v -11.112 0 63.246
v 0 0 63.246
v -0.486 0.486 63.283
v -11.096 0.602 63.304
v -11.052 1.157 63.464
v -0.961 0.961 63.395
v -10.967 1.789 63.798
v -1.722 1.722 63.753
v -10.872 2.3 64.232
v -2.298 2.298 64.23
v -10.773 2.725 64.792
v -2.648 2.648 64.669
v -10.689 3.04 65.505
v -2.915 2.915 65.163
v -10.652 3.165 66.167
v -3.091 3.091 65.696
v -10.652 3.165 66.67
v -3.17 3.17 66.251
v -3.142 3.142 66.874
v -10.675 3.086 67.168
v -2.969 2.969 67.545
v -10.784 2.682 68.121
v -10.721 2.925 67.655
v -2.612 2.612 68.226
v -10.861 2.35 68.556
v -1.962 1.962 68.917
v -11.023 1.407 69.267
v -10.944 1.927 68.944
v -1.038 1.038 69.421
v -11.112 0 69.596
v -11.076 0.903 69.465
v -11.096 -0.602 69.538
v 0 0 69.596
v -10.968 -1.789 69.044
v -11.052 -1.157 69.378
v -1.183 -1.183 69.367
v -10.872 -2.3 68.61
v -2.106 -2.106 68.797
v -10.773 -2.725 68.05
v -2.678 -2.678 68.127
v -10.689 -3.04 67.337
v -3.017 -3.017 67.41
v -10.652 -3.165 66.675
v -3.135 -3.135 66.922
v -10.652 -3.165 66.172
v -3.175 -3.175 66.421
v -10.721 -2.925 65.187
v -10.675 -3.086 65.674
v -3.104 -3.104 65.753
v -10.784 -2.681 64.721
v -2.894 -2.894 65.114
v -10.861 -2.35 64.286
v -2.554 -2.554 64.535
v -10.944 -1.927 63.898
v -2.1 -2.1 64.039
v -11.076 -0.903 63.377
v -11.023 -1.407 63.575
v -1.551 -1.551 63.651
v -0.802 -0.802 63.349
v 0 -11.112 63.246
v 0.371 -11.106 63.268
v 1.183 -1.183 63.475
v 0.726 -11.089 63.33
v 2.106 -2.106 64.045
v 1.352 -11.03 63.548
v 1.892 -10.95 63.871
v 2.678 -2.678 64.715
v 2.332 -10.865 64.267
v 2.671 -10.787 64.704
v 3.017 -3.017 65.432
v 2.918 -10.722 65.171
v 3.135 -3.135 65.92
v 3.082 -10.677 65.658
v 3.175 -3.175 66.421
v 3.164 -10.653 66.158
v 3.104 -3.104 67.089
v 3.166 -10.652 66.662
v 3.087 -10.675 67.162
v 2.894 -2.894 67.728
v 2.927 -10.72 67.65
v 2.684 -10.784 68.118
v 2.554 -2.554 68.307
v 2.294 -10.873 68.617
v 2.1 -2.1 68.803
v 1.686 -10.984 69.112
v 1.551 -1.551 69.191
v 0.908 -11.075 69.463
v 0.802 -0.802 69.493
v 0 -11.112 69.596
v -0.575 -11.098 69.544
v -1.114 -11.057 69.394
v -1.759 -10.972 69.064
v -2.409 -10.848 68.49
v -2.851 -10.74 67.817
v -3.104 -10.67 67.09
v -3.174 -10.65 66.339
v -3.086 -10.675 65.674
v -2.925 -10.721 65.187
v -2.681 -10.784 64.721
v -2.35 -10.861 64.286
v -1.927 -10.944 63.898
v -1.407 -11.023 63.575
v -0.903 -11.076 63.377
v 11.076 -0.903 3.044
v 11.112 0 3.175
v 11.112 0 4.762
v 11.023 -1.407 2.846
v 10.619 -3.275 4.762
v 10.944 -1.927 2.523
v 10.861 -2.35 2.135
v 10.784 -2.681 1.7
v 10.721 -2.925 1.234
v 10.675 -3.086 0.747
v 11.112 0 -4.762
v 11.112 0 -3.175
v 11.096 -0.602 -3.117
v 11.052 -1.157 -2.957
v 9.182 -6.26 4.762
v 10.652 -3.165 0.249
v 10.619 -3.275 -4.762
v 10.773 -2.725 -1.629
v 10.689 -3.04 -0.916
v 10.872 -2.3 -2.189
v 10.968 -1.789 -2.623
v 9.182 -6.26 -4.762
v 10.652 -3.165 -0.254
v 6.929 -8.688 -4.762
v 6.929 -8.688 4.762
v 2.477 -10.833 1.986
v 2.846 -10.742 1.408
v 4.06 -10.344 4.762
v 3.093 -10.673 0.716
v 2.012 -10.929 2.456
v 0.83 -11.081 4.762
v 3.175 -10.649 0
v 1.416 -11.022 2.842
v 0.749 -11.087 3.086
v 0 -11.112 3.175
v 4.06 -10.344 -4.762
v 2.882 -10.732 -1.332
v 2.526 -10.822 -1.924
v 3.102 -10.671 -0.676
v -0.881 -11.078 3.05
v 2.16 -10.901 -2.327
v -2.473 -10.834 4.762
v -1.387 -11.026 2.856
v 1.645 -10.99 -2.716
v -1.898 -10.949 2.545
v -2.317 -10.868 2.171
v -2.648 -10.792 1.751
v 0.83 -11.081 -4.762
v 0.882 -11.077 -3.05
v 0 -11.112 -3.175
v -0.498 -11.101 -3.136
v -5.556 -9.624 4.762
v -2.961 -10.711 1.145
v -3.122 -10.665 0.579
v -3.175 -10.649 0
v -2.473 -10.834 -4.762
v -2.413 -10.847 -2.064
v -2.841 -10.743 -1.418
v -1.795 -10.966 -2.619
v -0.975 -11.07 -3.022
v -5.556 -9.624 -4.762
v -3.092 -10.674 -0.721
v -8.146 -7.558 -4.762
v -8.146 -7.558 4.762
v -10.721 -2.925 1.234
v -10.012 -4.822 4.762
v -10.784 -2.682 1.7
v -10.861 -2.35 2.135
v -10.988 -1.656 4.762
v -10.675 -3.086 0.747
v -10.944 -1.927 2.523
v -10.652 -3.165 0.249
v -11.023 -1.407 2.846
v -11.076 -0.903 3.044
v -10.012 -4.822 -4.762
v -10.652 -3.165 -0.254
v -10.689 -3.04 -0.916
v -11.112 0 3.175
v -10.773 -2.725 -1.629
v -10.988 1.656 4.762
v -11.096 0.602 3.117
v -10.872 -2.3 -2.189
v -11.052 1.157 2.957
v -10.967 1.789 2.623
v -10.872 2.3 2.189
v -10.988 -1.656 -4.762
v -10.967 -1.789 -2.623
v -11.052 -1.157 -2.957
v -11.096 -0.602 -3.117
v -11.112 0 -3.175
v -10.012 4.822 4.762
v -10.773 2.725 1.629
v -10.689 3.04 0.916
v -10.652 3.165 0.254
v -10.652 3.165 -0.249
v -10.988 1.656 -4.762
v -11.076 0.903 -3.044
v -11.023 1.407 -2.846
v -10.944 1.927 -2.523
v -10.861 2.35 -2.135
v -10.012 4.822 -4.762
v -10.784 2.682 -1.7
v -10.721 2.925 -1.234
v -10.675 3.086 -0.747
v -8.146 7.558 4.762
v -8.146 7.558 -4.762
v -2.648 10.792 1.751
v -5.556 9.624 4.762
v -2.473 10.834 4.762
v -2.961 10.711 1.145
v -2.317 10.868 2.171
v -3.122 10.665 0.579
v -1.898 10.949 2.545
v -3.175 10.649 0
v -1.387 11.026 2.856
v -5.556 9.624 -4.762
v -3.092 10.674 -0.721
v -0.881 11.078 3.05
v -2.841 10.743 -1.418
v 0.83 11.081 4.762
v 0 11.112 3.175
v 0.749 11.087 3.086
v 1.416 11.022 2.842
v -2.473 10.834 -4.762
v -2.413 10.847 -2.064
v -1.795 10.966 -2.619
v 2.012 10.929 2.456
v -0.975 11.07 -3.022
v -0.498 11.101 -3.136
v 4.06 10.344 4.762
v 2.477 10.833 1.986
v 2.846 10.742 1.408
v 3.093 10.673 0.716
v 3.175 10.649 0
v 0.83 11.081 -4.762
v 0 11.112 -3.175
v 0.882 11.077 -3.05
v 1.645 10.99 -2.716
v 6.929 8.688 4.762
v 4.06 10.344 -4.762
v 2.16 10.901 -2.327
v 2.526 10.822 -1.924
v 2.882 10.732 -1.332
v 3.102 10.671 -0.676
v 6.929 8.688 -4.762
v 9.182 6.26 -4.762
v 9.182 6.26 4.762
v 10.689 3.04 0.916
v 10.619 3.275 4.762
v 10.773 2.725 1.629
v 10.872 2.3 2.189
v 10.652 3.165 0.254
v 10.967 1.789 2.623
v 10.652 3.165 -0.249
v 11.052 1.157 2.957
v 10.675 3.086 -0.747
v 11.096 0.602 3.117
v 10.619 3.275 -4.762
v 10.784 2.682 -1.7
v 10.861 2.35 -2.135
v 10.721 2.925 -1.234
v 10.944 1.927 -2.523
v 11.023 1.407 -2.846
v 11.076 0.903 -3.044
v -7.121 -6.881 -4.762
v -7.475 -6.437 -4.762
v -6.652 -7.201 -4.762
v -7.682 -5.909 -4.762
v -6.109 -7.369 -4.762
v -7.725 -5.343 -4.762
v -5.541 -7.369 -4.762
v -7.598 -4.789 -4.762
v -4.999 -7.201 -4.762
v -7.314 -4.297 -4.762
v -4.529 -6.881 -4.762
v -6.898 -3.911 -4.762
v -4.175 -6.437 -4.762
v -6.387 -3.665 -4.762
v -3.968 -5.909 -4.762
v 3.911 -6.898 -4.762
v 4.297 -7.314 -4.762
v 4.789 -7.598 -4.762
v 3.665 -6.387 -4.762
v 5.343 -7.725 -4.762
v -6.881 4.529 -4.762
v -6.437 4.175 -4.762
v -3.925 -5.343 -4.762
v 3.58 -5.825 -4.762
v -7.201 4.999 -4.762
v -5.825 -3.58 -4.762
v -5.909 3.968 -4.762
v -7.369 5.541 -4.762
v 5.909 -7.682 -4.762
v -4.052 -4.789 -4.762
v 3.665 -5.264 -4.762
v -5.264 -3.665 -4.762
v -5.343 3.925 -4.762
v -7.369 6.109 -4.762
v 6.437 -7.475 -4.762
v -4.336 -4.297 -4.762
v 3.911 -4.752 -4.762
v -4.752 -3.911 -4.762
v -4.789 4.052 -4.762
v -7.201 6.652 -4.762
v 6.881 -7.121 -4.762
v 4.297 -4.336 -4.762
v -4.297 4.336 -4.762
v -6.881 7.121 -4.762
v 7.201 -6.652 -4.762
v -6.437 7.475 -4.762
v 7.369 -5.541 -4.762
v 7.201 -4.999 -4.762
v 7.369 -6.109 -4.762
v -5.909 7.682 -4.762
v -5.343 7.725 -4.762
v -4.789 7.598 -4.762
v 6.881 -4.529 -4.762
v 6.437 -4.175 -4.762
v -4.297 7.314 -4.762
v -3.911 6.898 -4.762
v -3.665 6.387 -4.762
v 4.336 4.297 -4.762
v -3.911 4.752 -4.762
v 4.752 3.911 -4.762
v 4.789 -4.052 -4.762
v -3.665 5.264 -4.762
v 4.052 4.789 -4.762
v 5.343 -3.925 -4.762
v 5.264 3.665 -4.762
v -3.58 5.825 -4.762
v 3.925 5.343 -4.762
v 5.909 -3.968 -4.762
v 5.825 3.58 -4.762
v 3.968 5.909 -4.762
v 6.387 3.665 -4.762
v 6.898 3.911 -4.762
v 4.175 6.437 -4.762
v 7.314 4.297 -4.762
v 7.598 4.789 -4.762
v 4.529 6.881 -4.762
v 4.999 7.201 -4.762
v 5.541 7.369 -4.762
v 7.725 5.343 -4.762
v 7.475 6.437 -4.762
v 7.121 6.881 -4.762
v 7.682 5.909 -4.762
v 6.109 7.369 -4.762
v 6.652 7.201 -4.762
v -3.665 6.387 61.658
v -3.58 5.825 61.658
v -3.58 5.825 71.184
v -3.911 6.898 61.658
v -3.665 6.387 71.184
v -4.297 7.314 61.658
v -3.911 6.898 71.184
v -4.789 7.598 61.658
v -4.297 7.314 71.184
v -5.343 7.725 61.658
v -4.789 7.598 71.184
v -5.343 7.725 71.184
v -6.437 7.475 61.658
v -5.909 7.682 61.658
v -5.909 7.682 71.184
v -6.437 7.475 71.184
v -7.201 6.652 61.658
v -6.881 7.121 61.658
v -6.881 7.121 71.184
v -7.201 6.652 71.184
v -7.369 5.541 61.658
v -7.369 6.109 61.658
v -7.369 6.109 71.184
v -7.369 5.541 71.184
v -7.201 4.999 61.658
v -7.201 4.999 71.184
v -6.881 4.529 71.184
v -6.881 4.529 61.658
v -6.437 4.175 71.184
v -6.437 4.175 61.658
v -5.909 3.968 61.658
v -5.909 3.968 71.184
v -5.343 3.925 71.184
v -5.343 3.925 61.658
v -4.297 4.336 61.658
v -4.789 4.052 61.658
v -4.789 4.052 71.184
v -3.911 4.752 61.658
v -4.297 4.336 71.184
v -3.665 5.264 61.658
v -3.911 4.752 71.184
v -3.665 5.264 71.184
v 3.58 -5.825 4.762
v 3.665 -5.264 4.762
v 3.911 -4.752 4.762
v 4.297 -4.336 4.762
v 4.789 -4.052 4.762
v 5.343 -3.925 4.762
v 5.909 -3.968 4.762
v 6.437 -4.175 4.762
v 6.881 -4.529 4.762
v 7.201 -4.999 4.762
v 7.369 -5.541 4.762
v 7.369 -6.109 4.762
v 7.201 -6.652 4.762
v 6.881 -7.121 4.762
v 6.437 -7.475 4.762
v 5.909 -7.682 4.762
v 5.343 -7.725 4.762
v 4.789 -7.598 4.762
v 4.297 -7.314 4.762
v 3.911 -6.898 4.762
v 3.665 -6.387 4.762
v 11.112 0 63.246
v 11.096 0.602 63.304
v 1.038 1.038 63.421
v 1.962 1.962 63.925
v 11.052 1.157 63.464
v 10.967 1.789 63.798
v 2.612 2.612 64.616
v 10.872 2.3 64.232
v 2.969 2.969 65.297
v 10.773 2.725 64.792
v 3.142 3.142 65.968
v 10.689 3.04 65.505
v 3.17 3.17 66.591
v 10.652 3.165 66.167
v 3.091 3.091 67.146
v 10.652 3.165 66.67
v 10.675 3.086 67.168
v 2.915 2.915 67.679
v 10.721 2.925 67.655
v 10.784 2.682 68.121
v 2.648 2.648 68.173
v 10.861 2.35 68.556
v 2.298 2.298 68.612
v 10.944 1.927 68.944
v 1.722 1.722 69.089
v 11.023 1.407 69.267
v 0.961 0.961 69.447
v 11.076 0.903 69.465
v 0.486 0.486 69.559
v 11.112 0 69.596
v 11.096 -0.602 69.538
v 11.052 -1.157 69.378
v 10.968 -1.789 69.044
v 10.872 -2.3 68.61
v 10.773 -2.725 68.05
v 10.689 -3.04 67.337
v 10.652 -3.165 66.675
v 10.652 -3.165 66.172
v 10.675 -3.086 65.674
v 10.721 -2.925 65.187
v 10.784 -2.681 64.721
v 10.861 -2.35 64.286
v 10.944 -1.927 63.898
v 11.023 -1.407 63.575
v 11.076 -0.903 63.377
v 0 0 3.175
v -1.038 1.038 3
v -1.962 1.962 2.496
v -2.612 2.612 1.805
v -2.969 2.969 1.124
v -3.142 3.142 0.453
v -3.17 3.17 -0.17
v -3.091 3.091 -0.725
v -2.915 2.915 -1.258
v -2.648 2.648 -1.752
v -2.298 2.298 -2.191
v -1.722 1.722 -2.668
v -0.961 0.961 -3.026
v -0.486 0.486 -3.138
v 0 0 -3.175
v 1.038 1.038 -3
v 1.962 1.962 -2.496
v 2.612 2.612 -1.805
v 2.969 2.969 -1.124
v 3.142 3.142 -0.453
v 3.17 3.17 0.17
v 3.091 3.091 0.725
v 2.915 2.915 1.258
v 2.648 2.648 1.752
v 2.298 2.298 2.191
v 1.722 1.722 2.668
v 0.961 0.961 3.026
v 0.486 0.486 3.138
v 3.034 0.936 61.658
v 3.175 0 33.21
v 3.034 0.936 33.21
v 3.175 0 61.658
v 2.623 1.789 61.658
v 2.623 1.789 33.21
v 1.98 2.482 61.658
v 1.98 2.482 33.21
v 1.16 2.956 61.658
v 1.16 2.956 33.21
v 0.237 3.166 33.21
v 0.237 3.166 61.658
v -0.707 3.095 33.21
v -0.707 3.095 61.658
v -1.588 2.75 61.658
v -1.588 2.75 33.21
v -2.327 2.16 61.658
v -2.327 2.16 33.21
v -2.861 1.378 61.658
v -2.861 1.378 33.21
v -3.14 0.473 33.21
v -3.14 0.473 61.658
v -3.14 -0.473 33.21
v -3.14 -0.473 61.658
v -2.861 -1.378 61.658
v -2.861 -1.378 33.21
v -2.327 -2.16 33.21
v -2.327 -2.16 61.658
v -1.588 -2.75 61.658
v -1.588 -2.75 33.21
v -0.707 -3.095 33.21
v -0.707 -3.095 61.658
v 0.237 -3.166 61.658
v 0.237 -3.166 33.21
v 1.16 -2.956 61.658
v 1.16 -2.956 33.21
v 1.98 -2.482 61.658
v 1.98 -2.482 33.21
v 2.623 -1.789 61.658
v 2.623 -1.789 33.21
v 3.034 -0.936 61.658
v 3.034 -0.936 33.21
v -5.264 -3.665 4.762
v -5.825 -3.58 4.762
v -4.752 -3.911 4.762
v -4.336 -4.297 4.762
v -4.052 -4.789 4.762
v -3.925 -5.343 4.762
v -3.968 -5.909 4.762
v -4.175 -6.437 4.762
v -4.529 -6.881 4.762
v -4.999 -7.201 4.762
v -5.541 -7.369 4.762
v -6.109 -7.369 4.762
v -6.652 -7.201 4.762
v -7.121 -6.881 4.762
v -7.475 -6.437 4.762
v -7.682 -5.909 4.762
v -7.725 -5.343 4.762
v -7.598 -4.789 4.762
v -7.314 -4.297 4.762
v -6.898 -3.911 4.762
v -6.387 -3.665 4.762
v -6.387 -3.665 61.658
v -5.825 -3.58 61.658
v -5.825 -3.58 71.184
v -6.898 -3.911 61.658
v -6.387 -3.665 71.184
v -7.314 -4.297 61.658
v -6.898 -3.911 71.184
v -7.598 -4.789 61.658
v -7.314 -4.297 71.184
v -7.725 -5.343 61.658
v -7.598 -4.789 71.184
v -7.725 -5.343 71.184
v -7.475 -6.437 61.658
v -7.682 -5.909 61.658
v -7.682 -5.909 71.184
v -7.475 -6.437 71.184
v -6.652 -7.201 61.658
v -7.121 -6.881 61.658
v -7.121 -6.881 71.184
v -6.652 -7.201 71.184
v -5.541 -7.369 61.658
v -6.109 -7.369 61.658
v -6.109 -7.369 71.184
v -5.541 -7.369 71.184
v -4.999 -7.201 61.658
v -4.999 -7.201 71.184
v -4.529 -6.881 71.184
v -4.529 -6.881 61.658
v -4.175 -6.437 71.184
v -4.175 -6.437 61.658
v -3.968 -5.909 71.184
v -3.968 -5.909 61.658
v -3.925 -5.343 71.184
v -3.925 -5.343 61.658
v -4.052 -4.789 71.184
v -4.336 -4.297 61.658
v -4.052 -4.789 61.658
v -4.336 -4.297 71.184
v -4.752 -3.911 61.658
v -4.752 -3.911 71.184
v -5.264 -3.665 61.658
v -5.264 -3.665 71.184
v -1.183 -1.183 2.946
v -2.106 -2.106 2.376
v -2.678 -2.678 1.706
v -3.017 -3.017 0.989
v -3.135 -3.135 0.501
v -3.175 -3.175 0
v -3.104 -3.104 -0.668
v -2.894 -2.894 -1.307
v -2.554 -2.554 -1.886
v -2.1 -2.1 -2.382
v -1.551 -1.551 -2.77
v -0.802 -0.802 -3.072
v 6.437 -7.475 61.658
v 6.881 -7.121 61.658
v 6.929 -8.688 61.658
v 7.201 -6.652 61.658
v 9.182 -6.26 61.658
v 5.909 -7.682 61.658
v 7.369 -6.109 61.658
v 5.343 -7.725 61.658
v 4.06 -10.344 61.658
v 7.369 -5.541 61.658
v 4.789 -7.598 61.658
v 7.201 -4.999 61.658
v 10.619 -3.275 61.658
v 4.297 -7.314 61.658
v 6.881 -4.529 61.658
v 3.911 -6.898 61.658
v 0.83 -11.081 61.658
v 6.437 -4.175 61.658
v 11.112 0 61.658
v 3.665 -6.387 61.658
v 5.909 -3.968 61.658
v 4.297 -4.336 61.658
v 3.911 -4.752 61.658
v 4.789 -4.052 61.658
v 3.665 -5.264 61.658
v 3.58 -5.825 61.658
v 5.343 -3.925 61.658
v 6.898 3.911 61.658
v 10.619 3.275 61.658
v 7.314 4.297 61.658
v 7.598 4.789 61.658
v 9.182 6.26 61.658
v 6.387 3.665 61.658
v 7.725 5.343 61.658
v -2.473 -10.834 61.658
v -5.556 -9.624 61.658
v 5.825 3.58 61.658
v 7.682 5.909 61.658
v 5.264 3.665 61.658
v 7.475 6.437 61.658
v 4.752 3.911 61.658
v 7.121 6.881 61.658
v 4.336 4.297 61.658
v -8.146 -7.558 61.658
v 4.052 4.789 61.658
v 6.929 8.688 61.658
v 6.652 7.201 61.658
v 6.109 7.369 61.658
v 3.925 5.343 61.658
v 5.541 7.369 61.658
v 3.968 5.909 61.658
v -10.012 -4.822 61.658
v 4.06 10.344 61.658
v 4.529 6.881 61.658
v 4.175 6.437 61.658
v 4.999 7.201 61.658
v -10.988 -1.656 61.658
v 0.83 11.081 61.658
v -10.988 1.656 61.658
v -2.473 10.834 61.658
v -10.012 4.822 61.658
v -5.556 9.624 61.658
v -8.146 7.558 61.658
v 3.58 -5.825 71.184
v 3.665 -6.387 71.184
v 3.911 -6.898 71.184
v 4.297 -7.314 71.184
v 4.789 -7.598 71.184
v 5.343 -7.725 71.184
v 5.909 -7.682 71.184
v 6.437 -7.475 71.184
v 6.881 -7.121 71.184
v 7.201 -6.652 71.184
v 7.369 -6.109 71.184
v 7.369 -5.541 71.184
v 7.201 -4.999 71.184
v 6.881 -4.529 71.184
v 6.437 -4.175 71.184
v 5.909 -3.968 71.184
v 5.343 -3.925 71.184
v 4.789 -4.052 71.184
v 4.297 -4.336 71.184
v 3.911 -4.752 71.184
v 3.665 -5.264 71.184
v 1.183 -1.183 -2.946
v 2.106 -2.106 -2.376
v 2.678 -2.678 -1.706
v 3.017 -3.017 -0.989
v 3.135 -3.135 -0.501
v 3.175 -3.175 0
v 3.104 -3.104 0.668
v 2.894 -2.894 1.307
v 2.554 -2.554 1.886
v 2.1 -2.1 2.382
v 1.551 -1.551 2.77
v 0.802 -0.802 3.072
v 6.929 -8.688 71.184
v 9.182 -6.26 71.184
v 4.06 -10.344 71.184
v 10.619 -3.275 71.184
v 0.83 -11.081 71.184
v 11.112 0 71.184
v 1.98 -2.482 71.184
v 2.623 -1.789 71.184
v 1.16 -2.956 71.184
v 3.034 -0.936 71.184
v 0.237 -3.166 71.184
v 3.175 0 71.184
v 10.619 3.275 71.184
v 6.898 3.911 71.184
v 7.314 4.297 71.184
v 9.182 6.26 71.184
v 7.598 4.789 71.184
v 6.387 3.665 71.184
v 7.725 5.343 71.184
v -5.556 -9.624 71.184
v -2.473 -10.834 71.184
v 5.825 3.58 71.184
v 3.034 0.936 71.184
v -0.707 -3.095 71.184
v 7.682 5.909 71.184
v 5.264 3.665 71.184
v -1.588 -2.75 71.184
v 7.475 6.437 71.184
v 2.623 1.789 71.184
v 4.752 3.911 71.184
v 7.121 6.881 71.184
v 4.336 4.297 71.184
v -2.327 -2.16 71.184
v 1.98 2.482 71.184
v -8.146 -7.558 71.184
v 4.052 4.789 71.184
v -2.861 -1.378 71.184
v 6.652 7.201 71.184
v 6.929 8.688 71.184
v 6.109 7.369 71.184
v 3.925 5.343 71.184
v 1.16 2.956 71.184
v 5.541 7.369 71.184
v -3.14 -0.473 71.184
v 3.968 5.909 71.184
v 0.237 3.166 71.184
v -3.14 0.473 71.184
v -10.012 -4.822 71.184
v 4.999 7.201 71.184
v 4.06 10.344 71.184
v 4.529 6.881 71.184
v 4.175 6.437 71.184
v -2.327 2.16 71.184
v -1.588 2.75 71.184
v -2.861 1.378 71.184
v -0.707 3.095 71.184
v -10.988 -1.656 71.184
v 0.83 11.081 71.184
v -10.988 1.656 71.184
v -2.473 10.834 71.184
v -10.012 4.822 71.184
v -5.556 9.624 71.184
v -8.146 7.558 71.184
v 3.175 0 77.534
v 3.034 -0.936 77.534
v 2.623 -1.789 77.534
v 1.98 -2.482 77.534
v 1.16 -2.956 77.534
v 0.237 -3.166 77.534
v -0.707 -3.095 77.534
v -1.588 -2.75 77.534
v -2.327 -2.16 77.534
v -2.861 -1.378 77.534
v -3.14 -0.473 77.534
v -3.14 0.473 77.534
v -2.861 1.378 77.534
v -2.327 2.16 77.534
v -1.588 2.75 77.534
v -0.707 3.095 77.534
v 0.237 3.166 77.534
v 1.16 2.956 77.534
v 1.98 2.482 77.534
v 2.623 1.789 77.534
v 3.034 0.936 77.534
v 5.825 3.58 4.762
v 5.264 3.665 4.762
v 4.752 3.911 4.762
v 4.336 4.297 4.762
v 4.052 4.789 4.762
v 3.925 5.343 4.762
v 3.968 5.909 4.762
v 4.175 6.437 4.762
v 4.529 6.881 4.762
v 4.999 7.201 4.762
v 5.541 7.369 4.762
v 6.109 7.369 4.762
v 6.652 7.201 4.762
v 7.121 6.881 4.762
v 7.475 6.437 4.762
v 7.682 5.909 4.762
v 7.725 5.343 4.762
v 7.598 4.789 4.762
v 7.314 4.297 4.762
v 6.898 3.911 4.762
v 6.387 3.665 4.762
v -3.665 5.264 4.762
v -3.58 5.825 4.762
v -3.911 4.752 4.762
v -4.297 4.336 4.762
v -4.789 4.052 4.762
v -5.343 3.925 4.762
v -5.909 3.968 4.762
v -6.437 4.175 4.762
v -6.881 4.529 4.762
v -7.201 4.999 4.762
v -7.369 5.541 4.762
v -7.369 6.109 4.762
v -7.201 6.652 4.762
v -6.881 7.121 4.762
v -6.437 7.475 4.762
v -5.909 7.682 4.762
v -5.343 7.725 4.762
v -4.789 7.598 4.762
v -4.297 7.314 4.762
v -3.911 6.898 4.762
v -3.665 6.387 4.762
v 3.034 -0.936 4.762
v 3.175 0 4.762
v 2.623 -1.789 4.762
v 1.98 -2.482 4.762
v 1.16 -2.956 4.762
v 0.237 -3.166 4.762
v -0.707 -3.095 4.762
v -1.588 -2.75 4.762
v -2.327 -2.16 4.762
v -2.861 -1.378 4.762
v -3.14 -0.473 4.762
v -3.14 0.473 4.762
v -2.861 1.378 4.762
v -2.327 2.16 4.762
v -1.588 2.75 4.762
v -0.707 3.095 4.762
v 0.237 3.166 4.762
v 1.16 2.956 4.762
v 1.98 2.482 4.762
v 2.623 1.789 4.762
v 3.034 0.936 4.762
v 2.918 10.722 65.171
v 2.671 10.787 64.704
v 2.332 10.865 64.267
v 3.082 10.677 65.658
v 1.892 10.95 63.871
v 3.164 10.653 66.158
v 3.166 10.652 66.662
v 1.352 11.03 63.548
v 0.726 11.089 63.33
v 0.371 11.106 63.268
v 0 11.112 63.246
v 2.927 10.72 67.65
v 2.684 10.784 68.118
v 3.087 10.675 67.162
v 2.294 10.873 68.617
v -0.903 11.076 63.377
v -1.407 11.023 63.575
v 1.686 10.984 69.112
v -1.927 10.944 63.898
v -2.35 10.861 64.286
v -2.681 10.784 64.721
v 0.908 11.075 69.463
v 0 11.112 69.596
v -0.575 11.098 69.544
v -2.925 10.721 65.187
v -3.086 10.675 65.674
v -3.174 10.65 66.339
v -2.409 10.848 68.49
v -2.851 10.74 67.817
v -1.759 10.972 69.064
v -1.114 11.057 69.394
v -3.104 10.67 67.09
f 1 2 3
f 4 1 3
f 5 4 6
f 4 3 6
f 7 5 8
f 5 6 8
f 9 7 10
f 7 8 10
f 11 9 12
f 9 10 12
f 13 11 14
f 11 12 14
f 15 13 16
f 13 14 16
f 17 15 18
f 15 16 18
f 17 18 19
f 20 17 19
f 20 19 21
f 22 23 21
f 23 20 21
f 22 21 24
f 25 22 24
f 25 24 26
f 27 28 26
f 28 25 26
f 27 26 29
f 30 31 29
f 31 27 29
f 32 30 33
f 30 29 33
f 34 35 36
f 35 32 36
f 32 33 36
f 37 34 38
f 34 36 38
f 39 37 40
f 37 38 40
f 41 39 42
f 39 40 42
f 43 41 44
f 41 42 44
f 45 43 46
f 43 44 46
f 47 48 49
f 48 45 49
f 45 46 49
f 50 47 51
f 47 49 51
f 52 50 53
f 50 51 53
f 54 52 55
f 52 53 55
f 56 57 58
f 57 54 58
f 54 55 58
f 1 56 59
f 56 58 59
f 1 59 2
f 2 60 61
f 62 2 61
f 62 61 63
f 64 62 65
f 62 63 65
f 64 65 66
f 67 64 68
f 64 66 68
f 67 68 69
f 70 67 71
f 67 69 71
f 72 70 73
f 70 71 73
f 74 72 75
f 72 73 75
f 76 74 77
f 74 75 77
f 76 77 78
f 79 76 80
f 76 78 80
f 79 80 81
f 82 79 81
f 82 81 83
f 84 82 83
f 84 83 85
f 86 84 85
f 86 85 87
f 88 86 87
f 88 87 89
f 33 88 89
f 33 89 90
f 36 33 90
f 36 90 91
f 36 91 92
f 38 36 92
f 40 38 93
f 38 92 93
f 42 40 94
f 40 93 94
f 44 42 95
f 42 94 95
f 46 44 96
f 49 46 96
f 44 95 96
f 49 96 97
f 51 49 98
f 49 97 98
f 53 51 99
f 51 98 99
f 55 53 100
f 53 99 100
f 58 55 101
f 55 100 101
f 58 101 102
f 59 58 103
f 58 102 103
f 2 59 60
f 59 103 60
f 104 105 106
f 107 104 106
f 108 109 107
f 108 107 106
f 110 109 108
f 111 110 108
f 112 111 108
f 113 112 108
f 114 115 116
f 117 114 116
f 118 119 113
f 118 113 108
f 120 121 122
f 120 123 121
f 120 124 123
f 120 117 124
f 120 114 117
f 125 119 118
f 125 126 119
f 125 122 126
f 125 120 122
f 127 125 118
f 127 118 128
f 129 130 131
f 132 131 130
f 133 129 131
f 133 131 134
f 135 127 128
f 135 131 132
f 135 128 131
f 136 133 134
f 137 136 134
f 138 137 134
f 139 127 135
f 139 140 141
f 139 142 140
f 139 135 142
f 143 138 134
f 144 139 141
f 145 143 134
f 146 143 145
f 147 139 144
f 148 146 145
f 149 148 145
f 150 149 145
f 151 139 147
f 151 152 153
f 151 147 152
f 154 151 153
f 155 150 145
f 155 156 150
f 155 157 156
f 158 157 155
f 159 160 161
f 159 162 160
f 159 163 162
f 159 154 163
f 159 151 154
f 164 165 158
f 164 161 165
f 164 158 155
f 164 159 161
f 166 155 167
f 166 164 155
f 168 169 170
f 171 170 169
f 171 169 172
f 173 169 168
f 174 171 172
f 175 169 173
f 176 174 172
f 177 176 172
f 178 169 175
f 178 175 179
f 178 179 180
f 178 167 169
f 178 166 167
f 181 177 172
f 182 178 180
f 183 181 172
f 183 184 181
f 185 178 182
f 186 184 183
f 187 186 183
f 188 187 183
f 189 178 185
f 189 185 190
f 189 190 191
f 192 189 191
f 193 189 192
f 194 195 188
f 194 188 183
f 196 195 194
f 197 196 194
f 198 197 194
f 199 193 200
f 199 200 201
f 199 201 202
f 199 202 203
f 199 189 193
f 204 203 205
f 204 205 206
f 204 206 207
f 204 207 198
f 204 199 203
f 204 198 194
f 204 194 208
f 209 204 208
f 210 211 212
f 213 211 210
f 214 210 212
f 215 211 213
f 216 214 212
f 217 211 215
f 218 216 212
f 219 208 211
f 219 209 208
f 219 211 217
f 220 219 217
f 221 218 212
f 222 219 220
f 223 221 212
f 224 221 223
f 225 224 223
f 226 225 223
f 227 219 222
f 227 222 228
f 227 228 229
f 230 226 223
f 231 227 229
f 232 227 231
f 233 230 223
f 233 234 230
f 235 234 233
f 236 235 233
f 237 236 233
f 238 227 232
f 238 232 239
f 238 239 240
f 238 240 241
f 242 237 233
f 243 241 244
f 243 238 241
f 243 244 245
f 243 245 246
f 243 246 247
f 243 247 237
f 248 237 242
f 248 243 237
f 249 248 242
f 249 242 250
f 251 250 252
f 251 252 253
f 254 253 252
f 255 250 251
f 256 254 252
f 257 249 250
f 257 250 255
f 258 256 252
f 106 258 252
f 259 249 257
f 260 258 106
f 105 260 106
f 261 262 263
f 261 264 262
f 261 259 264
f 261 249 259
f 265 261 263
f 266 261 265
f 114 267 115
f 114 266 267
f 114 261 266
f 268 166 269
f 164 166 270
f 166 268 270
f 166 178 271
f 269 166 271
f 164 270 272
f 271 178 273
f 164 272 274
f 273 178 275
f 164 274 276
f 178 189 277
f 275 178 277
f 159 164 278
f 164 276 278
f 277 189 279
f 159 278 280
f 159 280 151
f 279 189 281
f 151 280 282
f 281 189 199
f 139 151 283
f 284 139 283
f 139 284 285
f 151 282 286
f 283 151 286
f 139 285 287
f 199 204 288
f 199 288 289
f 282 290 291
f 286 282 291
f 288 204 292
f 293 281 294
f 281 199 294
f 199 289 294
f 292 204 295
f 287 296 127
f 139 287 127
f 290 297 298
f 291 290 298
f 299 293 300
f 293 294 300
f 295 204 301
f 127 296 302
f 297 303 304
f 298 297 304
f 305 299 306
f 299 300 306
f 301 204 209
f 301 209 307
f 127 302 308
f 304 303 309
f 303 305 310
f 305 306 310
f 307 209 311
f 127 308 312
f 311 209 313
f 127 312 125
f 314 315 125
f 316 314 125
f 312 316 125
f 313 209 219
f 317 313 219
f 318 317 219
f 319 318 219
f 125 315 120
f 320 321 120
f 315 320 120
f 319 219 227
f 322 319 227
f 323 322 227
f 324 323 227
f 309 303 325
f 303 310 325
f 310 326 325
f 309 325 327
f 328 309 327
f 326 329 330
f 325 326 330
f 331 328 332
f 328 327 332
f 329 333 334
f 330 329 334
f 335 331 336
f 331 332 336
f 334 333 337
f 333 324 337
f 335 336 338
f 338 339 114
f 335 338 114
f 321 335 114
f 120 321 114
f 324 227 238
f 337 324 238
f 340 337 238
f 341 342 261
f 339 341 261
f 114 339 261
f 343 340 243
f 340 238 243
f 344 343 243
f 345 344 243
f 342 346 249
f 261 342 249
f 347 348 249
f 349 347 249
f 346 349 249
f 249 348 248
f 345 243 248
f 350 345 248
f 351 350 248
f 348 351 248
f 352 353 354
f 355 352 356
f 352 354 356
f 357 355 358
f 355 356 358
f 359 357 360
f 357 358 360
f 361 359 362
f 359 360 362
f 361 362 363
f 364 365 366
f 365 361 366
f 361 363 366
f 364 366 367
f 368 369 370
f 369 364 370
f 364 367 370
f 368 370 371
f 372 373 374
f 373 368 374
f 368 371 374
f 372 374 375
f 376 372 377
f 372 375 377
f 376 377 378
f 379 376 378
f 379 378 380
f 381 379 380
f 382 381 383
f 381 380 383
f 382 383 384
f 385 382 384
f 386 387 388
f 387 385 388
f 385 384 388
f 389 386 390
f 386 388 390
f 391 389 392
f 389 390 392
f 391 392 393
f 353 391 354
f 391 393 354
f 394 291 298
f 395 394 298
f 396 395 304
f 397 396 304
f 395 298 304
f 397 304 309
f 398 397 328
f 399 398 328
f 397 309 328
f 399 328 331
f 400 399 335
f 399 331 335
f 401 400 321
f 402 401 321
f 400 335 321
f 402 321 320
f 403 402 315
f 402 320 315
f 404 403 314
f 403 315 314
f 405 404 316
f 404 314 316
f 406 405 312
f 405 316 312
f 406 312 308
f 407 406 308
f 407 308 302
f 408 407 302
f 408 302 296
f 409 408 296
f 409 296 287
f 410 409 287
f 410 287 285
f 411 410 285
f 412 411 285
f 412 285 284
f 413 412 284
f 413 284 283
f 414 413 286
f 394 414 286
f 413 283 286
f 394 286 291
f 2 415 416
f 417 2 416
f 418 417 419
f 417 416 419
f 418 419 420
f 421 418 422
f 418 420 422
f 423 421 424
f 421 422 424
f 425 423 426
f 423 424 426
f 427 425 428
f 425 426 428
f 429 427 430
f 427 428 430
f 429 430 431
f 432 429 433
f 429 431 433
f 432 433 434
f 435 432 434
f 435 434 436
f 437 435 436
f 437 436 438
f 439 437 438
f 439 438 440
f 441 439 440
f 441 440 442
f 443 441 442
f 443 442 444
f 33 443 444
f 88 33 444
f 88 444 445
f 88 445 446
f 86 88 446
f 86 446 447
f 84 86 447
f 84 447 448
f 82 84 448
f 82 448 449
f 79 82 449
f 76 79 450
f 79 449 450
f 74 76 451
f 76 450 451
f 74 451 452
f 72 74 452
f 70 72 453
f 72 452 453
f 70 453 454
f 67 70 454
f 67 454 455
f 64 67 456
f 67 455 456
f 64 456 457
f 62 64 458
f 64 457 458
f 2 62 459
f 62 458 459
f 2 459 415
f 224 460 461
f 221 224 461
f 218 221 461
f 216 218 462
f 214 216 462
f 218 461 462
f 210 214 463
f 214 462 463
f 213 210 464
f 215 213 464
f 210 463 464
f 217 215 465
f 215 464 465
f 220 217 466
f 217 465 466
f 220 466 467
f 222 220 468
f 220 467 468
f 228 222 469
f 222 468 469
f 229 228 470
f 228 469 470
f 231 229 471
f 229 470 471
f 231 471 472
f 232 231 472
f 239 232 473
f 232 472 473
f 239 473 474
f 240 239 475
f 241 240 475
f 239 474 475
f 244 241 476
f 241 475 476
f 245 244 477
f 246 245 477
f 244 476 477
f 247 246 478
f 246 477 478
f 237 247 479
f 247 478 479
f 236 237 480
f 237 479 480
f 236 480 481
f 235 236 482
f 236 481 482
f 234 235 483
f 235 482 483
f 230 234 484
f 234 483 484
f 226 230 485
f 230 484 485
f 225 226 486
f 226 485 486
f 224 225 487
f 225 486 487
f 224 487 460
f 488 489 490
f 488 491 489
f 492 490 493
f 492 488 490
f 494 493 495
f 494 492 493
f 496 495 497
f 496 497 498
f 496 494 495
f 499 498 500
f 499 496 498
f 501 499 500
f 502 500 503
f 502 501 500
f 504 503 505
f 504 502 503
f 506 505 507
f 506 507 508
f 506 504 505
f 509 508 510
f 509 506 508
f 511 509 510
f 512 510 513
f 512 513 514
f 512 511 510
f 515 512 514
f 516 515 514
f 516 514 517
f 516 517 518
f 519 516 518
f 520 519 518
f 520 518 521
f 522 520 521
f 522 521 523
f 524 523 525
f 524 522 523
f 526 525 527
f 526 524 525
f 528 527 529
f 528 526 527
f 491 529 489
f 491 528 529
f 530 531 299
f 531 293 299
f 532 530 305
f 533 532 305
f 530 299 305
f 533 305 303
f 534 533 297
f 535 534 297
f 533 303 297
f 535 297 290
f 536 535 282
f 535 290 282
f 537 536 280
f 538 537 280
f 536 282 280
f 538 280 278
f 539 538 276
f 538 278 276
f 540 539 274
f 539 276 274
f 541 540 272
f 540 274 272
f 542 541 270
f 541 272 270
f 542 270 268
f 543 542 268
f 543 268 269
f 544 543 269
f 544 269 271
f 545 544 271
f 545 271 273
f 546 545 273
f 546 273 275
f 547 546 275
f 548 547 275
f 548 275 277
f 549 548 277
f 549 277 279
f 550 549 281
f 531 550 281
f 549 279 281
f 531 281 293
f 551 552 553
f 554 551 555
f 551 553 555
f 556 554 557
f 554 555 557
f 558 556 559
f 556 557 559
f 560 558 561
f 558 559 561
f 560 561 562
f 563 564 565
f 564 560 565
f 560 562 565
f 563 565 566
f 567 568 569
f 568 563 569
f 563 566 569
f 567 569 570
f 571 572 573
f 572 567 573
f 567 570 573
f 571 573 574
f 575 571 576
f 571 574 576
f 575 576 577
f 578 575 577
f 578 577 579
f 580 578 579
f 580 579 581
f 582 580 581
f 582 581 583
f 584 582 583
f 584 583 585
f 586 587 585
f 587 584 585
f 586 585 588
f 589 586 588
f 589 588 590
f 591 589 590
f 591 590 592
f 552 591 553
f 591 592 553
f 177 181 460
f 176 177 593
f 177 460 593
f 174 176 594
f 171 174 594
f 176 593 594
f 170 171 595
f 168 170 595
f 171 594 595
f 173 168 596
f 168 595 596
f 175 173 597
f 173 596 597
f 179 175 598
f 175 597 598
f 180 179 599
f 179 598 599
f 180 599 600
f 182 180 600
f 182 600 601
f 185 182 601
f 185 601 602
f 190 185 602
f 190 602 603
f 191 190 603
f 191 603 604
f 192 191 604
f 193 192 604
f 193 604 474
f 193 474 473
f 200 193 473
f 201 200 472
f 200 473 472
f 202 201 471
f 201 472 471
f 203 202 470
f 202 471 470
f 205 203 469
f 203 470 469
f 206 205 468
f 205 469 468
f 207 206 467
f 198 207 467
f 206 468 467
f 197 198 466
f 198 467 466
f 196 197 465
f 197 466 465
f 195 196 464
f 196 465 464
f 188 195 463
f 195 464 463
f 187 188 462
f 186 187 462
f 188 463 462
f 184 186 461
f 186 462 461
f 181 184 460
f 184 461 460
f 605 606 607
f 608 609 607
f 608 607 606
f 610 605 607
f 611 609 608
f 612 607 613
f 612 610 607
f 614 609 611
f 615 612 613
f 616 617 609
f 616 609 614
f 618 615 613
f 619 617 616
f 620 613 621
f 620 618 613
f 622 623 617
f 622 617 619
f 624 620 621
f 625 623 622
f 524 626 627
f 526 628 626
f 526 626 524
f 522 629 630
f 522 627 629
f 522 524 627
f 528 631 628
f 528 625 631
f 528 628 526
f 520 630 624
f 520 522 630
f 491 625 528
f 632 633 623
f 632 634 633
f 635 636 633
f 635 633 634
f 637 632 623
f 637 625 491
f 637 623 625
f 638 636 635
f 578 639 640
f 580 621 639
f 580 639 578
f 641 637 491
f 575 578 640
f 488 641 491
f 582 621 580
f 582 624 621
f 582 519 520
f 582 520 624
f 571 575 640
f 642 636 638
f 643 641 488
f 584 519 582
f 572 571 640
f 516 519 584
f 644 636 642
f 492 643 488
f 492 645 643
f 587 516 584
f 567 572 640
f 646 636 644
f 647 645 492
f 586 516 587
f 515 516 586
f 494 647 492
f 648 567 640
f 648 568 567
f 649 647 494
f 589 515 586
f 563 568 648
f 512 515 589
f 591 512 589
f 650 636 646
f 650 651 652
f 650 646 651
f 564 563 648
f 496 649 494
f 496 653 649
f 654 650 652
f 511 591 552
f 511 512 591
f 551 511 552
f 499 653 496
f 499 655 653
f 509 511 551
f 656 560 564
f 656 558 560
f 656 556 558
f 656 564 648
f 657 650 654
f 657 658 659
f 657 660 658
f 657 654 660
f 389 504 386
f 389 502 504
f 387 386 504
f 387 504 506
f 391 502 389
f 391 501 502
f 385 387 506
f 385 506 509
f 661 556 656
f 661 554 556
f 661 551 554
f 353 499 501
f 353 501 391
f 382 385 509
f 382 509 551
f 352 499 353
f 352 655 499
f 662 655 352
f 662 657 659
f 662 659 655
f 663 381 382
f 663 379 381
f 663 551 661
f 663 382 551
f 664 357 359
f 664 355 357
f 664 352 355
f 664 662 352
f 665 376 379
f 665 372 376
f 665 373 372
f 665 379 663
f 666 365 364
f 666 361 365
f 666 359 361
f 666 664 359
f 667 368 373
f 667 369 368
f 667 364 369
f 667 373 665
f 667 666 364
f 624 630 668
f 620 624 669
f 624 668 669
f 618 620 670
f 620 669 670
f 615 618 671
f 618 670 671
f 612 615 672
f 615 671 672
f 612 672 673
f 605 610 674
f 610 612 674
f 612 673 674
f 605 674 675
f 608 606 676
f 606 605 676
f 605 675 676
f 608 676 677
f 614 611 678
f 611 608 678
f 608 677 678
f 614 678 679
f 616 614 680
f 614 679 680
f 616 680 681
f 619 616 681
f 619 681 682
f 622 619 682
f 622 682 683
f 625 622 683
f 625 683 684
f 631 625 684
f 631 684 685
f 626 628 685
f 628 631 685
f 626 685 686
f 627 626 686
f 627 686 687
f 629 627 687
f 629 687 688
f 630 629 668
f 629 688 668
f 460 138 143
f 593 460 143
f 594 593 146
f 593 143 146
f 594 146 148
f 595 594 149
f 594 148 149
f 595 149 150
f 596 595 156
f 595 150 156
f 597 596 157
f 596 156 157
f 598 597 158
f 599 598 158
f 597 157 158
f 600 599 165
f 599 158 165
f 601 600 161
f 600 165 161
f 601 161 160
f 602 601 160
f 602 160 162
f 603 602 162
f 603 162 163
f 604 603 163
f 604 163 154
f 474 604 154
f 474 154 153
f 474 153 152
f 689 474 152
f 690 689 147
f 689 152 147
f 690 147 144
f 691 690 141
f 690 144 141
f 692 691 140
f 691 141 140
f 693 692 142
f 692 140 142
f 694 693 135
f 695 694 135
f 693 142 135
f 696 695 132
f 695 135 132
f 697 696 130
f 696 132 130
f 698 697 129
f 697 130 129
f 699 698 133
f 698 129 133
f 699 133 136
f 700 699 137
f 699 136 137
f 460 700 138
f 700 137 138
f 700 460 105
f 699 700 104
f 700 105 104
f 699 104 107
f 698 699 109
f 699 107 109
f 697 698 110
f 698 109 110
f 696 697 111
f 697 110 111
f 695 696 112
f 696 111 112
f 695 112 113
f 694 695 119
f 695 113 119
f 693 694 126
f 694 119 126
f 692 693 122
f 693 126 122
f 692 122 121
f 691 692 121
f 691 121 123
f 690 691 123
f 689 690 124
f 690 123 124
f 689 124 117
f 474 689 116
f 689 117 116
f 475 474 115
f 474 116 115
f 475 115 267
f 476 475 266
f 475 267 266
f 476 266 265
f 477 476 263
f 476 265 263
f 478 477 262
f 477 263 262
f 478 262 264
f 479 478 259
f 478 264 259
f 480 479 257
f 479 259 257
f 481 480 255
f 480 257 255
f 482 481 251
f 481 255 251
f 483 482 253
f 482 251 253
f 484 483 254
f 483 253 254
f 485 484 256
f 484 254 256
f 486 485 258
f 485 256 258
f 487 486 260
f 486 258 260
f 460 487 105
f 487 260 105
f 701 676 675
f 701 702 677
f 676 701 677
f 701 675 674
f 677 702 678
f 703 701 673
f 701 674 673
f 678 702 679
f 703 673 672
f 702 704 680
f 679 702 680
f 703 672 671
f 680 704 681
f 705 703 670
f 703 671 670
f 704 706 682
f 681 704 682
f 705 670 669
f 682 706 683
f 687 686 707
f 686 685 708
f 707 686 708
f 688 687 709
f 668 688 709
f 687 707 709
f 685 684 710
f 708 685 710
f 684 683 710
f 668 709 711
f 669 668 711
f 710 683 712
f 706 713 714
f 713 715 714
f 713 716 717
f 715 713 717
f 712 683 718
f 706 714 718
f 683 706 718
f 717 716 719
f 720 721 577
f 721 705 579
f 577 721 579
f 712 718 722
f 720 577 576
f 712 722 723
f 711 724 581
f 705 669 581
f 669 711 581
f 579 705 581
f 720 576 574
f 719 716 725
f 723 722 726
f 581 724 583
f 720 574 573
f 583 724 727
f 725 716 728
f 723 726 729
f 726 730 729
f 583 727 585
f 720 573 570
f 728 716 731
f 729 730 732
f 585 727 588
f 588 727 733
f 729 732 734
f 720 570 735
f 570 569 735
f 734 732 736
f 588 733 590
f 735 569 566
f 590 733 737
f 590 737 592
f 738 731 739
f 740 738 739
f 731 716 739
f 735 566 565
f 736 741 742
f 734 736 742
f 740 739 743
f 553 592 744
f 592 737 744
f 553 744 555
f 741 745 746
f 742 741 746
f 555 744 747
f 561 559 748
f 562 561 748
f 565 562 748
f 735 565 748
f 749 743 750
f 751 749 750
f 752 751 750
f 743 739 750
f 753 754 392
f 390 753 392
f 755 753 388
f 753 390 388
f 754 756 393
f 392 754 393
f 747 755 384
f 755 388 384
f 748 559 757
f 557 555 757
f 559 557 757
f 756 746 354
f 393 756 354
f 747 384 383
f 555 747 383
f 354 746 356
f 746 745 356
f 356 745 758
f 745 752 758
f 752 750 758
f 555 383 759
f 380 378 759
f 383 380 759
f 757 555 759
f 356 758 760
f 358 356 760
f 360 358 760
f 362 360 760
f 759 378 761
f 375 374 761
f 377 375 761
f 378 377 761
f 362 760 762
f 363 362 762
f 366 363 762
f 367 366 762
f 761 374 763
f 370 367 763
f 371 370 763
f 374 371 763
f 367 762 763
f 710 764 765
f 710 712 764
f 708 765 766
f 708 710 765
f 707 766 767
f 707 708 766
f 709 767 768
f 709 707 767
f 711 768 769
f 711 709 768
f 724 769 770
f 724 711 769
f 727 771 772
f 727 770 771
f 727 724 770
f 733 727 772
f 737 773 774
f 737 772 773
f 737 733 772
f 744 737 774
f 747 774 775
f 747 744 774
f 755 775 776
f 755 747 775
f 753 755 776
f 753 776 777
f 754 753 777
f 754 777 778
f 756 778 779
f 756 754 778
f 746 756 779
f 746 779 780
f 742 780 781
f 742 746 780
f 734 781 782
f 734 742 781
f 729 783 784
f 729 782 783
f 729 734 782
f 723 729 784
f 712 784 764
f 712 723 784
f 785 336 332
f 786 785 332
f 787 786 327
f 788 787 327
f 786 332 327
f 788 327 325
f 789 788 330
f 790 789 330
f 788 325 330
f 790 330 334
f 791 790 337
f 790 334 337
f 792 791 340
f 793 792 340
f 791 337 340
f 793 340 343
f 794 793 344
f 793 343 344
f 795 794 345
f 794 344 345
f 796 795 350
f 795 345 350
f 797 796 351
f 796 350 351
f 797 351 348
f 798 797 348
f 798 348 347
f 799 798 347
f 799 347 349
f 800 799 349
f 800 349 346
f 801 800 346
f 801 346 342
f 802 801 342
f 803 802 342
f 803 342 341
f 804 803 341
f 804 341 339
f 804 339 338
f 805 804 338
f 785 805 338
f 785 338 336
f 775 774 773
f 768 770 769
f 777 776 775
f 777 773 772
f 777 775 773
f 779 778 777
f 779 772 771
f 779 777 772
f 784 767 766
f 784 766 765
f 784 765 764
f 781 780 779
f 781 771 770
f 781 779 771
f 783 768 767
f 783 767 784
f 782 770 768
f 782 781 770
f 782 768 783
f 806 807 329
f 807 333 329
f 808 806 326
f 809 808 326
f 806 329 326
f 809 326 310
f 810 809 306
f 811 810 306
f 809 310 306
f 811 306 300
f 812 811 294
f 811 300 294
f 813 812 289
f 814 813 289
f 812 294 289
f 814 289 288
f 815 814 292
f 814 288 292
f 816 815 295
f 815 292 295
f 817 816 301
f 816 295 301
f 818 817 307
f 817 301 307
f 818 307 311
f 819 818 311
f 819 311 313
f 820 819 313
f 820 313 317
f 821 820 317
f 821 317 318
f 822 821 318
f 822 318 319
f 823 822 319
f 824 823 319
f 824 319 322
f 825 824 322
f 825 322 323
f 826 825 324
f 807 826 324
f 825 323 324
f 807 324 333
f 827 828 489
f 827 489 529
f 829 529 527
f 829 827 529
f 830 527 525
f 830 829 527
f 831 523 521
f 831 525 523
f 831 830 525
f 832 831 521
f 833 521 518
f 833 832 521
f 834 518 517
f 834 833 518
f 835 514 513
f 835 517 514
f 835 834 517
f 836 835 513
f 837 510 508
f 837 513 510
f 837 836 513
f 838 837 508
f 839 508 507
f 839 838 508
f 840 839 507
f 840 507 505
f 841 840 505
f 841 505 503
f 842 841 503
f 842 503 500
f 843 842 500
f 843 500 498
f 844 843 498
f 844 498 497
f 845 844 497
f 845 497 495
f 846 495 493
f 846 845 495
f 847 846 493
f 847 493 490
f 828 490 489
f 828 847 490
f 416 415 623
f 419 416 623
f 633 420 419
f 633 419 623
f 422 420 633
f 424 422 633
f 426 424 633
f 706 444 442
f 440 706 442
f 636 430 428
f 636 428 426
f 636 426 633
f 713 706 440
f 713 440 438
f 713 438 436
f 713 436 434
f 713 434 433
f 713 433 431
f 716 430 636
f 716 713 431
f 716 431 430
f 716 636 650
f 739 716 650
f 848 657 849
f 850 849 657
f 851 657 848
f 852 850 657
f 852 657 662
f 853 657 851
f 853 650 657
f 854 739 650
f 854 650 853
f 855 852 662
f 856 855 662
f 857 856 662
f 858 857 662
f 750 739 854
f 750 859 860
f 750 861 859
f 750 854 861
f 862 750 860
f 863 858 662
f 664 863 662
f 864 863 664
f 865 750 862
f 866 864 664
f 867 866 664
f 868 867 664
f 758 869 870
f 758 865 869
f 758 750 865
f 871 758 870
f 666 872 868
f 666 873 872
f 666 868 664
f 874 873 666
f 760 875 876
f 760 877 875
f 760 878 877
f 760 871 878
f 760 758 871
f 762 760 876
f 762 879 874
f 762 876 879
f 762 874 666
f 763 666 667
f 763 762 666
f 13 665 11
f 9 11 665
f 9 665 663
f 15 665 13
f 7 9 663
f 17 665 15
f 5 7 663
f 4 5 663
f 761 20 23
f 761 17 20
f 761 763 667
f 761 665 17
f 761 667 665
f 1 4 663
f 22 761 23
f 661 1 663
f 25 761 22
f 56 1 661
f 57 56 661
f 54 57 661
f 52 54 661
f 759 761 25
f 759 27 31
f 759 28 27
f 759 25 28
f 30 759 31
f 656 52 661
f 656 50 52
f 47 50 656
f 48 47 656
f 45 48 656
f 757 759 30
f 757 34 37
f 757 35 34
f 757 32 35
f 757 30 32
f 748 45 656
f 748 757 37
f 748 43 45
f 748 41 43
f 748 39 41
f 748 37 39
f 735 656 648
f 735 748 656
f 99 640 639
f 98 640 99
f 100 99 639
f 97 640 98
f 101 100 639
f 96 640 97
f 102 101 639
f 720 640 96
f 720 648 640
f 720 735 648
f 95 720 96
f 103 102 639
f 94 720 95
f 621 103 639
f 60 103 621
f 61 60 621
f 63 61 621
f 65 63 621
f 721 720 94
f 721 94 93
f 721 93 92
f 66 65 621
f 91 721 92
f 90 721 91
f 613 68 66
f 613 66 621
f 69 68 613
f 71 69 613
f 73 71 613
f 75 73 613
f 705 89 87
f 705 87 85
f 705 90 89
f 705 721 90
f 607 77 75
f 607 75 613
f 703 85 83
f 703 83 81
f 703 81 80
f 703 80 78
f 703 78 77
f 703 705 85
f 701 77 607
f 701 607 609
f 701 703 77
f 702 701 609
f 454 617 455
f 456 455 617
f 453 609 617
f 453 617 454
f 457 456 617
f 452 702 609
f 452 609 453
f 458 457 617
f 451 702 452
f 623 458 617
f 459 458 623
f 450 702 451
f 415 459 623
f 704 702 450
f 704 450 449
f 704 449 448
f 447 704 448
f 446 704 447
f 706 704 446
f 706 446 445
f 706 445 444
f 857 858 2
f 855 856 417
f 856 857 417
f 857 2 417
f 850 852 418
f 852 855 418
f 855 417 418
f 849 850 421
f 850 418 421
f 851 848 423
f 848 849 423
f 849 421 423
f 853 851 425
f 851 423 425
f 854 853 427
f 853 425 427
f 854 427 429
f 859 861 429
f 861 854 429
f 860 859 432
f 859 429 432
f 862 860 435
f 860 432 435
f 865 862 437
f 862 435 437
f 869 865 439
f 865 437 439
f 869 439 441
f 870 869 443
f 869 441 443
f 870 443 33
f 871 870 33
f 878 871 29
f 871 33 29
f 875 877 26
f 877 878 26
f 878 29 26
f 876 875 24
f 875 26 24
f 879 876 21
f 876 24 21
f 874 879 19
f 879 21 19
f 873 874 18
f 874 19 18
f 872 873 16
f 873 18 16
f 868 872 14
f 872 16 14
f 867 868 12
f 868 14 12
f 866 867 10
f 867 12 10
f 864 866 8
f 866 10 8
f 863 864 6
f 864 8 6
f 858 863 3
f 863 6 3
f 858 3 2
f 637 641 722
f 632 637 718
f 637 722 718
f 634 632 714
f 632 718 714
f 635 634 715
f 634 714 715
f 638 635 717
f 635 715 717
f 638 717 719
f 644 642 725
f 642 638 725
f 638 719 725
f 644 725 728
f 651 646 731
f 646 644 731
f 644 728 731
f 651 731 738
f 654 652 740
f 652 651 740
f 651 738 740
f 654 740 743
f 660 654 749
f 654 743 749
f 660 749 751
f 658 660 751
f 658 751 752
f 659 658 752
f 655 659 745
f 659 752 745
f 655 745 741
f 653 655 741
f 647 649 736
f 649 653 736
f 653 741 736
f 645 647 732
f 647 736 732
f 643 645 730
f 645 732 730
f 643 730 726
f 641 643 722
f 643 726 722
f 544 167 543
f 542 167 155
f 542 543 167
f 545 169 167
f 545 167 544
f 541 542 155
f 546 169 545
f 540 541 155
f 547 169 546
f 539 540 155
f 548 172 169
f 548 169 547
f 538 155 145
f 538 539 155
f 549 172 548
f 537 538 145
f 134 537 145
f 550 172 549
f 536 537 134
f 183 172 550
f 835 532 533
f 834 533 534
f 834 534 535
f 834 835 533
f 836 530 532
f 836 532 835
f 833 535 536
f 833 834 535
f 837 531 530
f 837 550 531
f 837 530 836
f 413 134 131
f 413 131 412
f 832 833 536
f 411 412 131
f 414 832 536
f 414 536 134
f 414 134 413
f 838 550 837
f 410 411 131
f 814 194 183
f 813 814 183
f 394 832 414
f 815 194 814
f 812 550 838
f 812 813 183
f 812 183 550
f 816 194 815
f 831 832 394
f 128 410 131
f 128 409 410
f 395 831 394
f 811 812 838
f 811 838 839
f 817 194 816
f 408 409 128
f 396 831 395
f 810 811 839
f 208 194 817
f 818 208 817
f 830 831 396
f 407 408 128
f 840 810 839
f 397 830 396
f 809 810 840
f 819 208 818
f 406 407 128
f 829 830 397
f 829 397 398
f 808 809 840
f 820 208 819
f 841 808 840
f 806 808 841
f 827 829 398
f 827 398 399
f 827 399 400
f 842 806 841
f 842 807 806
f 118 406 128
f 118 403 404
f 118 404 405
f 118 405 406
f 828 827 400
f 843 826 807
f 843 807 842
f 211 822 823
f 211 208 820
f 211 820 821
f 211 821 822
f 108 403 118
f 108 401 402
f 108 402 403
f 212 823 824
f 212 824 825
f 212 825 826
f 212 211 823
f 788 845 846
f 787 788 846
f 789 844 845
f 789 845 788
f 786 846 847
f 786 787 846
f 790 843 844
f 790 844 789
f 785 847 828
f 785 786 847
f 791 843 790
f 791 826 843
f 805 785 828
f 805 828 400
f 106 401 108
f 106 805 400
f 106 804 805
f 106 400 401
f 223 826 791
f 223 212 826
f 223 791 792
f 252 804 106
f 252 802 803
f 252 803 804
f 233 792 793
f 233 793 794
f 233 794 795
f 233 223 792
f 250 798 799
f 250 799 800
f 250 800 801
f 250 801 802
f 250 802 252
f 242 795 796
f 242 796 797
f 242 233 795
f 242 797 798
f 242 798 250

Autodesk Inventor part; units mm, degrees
ref_plane "YZ Plane" through (0, 0, 0) normal (1, 0, 0) x (0, 1, 0)
ref_plane "XY Plane" through (0, 0, 0) normal (0, 0, 1) x (1, 0, 0)
sketch "Sketch2" plane through (0, 0, 0) normal (0, 0, 1) x (1, 0, 0)
  line L0 (0, 0) -> (3.175, -3.175) projected
  circle A0 centre (0, 0) radius 11.1125
  dimension "d6" = 22.225
extrude "Extrusion2" add sketch "Sketch2" along normal mid plane 9.525
sketch "Sketch6" plane through (0, 0, 4.7625) normal (0, 0, 1) x (1, 0, 0)
  circle A0 centre (0, 0) radius 3.175
  dimension "d17" = 6.35
extrude "Extrusion3" add sketch "Sketch6" along normal blind 28.448
sketch "Sketch7" plane through (0, 0, 4.7625) normal (0, 0, 1) x (1, 0, 0)
  circle A0 centre (0, 0) radius 3.175 projected
  line L0 (5.8251, 5.4849) -> (0.0652, -0.2751)
  line L1 (0, 0) -> (5.491, 0)
  dimension "d20" = 8.001
  dimension "d42" = 45
hole "Hole2" at (5.8251, 5.4849, 4.7625) direction (0, 0, -1) diameter 3.81 end through all
pattern_circular "Circular Pattern2" count 4 over 360 about axis through (0, 0, 4.7625) along (0, 0, 1) of "Hole2"
ref_plane "Work Plane2" through (0, 11.1125, 0) normal (0, 1, 0) x (-1, 0, 0)
sketch "Sketch8" plane through (0, 11.1125, 0) normal (0, 1, 0) x (-1, 0, 0)
  point P0 (0, 0)
  point P1 (0, 0)
hole "Hole3" at (0, 11.1125, 0) direction (0, -1, 0) diameter 6.35 end through all
pattern_circular "Circular Pattern3" count 4 over 360 about axis through (0, 0, 4.7625) along (0, 0, 1) of "Hole3"
mirror "Mirror1" about plane through (0, 0, 33.2105) normal (0, 0, 1) of "Extrusion2", "Hole2", "Circular Pattern2", "Extrusion3", "Hole3", "Circular Pattern3"
sketch "Sketch9" plane through (0, 0, 71.1835) normal (0, 0, 1) x (1, 0, 0)
  line L0 (0, 0) -> (0, 0) projected
  circle A0 centre (0, 0) radius 3.175
  dimension "d43" = 6.35
extrude "Extrusion4" add sketch "Sketch9" along normal blind 6.35
properties part number "SweeperHub"
